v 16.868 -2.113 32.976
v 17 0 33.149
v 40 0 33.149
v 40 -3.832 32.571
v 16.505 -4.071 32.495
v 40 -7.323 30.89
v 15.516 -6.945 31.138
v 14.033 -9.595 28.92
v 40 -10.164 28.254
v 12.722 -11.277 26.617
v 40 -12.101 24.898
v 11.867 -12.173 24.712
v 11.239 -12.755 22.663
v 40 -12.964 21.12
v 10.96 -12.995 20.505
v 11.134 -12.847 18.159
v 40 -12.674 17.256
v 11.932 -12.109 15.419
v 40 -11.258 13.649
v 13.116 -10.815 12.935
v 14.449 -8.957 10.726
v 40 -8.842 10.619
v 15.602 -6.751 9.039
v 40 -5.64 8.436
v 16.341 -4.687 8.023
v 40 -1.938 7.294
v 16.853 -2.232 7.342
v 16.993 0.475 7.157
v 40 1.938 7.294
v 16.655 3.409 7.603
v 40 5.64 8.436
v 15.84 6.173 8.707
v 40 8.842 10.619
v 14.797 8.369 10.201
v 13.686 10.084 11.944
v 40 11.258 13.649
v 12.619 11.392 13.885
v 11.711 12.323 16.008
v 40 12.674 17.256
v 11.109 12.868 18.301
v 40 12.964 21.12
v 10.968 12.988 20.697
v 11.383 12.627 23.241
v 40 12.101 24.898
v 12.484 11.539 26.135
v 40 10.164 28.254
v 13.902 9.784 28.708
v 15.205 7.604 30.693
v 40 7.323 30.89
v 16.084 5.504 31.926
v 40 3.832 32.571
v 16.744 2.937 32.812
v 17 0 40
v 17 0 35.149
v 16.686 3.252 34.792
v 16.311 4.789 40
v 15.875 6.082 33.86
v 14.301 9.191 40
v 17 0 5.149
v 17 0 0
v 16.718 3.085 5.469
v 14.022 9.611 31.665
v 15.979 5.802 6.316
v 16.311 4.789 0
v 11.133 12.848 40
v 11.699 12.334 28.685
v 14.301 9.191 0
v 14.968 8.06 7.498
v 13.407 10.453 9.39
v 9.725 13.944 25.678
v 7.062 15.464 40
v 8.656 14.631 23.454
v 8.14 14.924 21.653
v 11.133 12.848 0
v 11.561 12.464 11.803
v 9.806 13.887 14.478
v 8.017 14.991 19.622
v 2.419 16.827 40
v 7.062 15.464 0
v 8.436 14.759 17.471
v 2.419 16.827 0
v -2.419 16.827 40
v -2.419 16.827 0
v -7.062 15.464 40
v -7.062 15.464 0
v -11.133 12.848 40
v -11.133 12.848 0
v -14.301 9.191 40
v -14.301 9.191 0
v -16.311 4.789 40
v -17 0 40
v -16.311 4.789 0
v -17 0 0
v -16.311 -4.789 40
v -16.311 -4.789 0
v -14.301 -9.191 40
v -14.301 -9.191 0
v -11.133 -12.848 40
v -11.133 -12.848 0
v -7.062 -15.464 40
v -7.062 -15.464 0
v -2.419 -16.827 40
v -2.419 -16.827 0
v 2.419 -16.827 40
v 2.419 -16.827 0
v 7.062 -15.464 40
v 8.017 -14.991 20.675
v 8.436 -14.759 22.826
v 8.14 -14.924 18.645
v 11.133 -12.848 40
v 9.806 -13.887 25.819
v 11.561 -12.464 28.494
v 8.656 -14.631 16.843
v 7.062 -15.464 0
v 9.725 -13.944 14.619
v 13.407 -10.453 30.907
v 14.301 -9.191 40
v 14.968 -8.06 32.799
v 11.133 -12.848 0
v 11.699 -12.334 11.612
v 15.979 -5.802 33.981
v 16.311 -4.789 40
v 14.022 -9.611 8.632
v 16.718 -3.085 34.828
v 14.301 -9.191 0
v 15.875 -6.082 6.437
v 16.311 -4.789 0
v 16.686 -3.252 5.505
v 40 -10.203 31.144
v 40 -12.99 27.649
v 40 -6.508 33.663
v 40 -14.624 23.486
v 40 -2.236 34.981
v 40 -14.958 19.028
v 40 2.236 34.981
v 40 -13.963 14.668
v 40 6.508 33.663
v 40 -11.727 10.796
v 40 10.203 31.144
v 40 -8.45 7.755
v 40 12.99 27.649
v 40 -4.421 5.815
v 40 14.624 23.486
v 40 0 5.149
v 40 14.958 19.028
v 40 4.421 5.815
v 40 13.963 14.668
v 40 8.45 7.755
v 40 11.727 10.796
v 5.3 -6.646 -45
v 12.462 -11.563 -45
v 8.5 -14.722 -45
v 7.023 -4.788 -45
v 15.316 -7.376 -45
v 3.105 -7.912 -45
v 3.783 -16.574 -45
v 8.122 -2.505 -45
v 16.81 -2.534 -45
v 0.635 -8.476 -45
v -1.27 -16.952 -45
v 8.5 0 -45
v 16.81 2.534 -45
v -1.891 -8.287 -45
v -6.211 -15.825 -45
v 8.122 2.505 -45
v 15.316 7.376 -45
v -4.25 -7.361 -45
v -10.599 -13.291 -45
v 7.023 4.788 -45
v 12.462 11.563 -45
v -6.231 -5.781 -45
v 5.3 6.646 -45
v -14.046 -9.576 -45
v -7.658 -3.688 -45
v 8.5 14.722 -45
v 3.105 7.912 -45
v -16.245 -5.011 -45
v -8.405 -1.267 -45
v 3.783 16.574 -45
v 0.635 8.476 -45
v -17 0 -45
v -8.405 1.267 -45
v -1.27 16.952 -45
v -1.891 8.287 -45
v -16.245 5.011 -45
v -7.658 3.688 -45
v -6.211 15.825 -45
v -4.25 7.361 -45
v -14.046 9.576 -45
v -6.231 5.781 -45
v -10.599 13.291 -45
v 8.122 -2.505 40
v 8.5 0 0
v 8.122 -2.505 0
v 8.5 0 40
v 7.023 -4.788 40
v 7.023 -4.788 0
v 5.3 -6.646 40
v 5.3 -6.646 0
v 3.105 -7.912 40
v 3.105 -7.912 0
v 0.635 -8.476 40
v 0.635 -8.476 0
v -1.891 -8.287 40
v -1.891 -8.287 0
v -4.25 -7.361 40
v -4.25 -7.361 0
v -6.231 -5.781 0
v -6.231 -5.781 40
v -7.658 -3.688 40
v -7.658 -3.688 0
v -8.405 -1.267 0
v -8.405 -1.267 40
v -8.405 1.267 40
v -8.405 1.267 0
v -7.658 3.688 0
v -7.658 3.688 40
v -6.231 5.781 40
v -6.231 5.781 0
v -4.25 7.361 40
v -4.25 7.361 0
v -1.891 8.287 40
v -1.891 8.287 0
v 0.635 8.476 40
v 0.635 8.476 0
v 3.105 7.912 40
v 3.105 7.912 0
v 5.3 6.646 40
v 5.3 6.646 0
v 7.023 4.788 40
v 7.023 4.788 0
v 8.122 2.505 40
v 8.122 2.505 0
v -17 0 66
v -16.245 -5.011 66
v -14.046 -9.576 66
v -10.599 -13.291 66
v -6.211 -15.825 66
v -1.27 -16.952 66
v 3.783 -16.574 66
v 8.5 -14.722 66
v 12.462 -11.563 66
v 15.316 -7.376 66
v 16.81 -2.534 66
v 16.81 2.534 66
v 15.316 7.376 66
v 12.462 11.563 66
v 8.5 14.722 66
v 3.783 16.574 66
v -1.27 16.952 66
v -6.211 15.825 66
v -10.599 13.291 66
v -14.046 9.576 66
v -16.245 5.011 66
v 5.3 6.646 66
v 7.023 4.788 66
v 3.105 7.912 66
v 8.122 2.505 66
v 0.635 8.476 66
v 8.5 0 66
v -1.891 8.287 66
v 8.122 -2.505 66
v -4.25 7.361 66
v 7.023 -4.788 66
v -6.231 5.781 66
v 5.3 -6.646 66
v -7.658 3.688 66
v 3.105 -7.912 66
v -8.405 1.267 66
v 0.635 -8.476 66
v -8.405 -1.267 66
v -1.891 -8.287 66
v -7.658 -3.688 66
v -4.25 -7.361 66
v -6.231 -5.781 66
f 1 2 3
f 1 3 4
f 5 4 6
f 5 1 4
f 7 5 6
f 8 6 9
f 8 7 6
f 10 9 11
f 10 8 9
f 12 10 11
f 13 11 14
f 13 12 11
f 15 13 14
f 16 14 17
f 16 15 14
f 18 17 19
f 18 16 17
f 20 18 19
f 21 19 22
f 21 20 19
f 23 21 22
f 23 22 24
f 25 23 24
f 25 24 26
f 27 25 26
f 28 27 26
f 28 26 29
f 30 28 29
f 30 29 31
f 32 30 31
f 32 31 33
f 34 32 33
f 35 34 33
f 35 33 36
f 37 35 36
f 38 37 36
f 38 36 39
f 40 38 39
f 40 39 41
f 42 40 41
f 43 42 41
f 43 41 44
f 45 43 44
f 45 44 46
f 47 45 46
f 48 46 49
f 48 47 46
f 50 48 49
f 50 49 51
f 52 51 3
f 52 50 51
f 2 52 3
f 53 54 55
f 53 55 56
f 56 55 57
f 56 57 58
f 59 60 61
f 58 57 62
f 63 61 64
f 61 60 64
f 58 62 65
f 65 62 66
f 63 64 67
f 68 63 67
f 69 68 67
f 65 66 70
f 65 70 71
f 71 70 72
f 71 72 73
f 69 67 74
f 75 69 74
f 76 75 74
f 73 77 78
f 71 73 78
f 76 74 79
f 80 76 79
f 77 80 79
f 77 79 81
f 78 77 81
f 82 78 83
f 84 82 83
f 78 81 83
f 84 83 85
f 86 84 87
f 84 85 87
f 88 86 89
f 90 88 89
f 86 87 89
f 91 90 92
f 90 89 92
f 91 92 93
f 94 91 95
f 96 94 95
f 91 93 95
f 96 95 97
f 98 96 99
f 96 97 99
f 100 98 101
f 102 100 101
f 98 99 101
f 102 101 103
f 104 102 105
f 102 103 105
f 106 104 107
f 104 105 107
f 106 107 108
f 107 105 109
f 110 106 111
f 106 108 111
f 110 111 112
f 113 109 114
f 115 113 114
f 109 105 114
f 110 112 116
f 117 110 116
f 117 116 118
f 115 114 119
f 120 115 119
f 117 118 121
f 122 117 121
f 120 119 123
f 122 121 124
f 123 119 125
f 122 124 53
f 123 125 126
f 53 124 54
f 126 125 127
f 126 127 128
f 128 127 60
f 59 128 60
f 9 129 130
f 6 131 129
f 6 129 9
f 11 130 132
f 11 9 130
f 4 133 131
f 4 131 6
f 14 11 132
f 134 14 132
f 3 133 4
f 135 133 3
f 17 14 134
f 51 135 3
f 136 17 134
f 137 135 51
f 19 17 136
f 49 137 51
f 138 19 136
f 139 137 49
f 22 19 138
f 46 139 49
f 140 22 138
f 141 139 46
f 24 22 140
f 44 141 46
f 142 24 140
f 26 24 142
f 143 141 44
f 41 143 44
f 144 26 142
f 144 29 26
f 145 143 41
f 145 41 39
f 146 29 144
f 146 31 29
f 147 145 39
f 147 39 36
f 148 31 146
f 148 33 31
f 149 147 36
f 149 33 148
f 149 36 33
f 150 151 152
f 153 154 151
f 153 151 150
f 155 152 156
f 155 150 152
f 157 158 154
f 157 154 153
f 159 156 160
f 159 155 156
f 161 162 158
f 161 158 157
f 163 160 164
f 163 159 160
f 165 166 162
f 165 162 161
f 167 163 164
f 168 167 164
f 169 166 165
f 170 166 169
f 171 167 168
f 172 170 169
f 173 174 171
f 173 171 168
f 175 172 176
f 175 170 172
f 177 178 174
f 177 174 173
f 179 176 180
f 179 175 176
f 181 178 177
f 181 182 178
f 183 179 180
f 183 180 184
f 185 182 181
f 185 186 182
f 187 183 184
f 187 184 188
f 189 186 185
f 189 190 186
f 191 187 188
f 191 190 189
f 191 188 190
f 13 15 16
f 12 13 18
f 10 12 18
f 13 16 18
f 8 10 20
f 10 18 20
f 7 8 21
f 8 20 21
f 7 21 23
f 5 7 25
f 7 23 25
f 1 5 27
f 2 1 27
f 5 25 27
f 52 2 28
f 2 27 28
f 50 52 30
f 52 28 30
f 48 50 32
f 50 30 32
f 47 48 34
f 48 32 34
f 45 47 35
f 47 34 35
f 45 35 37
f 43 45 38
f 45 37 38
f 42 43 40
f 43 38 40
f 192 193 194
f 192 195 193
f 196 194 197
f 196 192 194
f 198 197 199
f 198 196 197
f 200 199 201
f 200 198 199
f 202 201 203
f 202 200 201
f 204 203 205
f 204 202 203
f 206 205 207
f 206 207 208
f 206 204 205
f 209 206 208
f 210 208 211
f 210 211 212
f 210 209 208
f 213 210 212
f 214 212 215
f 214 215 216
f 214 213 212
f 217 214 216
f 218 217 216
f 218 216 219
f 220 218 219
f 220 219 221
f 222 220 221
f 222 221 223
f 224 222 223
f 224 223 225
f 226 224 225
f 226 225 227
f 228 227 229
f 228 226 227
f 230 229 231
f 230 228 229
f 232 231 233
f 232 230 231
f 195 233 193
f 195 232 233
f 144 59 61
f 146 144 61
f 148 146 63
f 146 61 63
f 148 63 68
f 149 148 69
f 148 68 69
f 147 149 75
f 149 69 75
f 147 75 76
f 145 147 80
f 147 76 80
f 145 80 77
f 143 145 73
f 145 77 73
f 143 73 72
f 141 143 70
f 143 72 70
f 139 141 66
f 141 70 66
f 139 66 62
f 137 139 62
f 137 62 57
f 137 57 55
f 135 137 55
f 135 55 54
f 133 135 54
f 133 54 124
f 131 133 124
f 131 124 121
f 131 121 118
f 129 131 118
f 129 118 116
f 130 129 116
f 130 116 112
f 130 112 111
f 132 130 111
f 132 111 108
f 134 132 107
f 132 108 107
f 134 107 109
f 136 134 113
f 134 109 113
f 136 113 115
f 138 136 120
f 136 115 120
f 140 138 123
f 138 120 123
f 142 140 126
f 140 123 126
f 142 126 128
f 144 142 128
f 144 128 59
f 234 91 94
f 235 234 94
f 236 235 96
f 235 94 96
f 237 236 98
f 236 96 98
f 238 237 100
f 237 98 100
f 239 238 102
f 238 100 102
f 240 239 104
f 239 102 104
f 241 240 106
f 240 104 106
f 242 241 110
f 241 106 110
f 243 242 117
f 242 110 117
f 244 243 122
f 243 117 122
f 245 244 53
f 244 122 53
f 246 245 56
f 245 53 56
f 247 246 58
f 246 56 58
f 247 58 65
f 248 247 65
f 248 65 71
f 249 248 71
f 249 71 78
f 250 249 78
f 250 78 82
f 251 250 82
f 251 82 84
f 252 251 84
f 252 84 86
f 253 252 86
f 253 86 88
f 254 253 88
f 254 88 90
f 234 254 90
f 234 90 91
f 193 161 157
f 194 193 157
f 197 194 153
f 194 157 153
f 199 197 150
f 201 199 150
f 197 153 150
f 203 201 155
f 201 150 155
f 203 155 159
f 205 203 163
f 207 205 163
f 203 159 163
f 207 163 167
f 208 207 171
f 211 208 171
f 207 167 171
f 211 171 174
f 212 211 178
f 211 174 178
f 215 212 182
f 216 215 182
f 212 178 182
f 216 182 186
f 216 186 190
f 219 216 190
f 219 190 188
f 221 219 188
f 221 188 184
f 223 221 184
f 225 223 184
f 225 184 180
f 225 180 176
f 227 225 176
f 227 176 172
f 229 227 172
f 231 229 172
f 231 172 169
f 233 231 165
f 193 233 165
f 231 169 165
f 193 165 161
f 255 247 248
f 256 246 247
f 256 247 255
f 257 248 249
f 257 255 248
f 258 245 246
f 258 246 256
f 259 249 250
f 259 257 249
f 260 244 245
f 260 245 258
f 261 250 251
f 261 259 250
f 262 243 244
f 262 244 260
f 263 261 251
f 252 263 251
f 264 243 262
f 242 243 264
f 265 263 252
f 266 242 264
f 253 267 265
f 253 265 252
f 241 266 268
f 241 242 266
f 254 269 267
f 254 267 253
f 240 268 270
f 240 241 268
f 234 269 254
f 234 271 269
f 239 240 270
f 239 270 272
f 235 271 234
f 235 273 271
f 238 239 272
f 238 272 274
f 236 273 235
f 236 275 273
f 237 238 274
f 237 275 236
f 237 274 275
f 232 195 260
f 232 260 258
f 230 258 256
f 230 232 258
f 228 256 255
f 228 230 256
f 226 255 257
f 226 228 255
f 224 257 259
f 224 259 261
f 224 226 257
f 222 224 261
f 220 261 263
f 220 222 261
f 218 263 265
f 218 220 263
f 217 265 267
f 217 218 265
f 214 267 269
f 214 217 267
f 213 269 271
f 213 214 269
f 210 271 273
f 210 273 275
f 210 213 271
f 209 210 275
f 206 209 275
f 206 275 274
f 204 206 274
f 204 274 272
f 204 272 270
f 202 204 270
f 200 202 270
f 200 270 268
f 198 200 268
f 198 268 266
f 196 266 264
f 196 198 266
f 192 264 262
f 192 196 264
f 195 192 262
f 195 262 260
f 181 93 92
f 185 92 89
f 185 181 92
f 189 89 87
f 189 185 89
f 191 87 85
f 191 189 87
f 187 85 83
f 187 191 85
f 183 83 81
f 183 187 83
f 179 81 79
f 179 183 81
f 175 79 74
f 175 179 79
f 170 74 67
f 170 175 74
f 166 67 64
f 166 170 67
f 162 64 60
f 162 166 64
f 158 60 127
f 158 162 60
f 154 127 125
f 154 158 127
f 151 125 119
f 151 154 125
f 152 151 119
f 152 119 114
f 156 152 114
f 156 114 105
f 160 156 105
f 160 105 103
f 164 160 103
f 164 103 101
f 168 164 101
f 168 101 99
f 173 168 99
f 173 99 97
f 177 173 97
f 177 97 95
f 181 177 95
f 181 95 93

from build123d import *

# Parameters (mm, degrees)
SKETCH1_R           = 17
BOSS_EXTRUDE2_DEPTH = 40
SKETCH2_R           = 8.5
CUT_EXTRUDE1_DEPTH  = 38
CUT_EXTRUDE2_START  = -38
SKETCH3_R           = 8.5
CUT_EXTRUDE2_DEPTH  = 38
SKETCH4_R           = 15
SKETCH4_R_2         = 13
BOSS_EXTRUDE3_DEPTH = 40
CUT_EXTRUDE4_START  = -50
SKETCH6_R           = 8.5
CUT_EXTRUDE4_DEPTH  = 50
BOSS_EXTRUDE4_START = 45
SKETCH7_R           = 17
SKETCH7_R_2         = 8.5
BOSS_EXTRUDE4_DEPTH = 45
SKETCH8_R           = 17
SKETCH8_R_2         = 8.5
BOSS_EXTRUDE5_DEPTH = 26


with BuildPart() as part:
    # Sketch1 → Boss-Extrude2 (new body)
    with BuildSketch(Plane.XY):
        Circle(SKETCH1_R)
    extrude(amount=BOSS_EXTRUDE2_DEPTH)

    # Sketch2 → Cut-Extrude1 (cut)
    with BuildSketch(Plane.XY.offset(40)):
        Circle(SKETCH2_R)
    extrude(amount=-CUT_EXTRUDE1_DEPTH, mode=Mode.SUBTRACT)

    # Sketch3 → Cut-Extrude2 (cut)
    with BuildSketch(Plane(origin=(0, 0, 0), x_dir=(-1, 0, 0), z_dir=(0, 0, -1)).offset(CUT_EXTRUDE2_START)):
        with Locations(Location((0, 0, 0), (0, 0, 180))):
            Circle(SKETCH3_R)
    extrude(amount=CUT_EXTRUDE2_DEPTH, mode=Mode.SUBTRACT)

    # Sketch4 → Boss-Extrude3 (add)
    with BuildSketch(Plane(origin=(0, 0, 0), x_dir=(0, 0, -1), z_dir=(1, 0, 0))):
        with Locations((-20.148533522, 0)):
            Circle(SKETCH4_R)
        with Locations(Location((-20.148533522, 0, 0), (0, 0, 180))):
            Circle(SKETCH4_R_2, mode=Mode.SUBTRACT)
    extrude(amount=BOSS_EXTRUDE3_DEPTH)

    # Sketch6 → Cut-Extrude4 (cut)
    with BuildSketch(Plane(origin=(0, 0, 0), x_dir=(-1, 0, 0), z_dir=(0, 0, -1)).offset(CUT_EXTRUDE4_START)):
        with Locations(Location((0, 0, 0), (0, 0, 180))):
            Circle(SKETCH6_R)
    extrude(amount=CUT_EXTRUDE4_DEPTH, mode=Mode.SUBTRACT)

    # Sketch7 → Boss-Extrude4 (add)
    with BuildSketch(Plane(origin=(0, 0, 0), x_dir=(-1, 0, 0), z_dir=(0, 0, -1)).offset(BOSS_EXTRUDE4_START)):
        Circle(SKETCH7_R)
        with Locations(Location((0, 0, 0), (0, 0, 180))):
            Circle(SKETCH7_R_2, mode=Mode.SUBTRACT)
    extrude(amount=-BOSS_EXTRUDE4_DEPTH)

    # Sketch8 → Boss-Extrude5 (add)
    with BuildSketch(Plane.XY.offset(40)):
        with Locations(Location((0, 0, 0), (0, 0, 180))):
            Circle(SKETCH8_R)
        Circle(SKETCH8_R_2, mode=Mode.SUBTRACT)
    extrude(amount=BOSS_EXTRUDE5_DEPTH)


solid = part.part
